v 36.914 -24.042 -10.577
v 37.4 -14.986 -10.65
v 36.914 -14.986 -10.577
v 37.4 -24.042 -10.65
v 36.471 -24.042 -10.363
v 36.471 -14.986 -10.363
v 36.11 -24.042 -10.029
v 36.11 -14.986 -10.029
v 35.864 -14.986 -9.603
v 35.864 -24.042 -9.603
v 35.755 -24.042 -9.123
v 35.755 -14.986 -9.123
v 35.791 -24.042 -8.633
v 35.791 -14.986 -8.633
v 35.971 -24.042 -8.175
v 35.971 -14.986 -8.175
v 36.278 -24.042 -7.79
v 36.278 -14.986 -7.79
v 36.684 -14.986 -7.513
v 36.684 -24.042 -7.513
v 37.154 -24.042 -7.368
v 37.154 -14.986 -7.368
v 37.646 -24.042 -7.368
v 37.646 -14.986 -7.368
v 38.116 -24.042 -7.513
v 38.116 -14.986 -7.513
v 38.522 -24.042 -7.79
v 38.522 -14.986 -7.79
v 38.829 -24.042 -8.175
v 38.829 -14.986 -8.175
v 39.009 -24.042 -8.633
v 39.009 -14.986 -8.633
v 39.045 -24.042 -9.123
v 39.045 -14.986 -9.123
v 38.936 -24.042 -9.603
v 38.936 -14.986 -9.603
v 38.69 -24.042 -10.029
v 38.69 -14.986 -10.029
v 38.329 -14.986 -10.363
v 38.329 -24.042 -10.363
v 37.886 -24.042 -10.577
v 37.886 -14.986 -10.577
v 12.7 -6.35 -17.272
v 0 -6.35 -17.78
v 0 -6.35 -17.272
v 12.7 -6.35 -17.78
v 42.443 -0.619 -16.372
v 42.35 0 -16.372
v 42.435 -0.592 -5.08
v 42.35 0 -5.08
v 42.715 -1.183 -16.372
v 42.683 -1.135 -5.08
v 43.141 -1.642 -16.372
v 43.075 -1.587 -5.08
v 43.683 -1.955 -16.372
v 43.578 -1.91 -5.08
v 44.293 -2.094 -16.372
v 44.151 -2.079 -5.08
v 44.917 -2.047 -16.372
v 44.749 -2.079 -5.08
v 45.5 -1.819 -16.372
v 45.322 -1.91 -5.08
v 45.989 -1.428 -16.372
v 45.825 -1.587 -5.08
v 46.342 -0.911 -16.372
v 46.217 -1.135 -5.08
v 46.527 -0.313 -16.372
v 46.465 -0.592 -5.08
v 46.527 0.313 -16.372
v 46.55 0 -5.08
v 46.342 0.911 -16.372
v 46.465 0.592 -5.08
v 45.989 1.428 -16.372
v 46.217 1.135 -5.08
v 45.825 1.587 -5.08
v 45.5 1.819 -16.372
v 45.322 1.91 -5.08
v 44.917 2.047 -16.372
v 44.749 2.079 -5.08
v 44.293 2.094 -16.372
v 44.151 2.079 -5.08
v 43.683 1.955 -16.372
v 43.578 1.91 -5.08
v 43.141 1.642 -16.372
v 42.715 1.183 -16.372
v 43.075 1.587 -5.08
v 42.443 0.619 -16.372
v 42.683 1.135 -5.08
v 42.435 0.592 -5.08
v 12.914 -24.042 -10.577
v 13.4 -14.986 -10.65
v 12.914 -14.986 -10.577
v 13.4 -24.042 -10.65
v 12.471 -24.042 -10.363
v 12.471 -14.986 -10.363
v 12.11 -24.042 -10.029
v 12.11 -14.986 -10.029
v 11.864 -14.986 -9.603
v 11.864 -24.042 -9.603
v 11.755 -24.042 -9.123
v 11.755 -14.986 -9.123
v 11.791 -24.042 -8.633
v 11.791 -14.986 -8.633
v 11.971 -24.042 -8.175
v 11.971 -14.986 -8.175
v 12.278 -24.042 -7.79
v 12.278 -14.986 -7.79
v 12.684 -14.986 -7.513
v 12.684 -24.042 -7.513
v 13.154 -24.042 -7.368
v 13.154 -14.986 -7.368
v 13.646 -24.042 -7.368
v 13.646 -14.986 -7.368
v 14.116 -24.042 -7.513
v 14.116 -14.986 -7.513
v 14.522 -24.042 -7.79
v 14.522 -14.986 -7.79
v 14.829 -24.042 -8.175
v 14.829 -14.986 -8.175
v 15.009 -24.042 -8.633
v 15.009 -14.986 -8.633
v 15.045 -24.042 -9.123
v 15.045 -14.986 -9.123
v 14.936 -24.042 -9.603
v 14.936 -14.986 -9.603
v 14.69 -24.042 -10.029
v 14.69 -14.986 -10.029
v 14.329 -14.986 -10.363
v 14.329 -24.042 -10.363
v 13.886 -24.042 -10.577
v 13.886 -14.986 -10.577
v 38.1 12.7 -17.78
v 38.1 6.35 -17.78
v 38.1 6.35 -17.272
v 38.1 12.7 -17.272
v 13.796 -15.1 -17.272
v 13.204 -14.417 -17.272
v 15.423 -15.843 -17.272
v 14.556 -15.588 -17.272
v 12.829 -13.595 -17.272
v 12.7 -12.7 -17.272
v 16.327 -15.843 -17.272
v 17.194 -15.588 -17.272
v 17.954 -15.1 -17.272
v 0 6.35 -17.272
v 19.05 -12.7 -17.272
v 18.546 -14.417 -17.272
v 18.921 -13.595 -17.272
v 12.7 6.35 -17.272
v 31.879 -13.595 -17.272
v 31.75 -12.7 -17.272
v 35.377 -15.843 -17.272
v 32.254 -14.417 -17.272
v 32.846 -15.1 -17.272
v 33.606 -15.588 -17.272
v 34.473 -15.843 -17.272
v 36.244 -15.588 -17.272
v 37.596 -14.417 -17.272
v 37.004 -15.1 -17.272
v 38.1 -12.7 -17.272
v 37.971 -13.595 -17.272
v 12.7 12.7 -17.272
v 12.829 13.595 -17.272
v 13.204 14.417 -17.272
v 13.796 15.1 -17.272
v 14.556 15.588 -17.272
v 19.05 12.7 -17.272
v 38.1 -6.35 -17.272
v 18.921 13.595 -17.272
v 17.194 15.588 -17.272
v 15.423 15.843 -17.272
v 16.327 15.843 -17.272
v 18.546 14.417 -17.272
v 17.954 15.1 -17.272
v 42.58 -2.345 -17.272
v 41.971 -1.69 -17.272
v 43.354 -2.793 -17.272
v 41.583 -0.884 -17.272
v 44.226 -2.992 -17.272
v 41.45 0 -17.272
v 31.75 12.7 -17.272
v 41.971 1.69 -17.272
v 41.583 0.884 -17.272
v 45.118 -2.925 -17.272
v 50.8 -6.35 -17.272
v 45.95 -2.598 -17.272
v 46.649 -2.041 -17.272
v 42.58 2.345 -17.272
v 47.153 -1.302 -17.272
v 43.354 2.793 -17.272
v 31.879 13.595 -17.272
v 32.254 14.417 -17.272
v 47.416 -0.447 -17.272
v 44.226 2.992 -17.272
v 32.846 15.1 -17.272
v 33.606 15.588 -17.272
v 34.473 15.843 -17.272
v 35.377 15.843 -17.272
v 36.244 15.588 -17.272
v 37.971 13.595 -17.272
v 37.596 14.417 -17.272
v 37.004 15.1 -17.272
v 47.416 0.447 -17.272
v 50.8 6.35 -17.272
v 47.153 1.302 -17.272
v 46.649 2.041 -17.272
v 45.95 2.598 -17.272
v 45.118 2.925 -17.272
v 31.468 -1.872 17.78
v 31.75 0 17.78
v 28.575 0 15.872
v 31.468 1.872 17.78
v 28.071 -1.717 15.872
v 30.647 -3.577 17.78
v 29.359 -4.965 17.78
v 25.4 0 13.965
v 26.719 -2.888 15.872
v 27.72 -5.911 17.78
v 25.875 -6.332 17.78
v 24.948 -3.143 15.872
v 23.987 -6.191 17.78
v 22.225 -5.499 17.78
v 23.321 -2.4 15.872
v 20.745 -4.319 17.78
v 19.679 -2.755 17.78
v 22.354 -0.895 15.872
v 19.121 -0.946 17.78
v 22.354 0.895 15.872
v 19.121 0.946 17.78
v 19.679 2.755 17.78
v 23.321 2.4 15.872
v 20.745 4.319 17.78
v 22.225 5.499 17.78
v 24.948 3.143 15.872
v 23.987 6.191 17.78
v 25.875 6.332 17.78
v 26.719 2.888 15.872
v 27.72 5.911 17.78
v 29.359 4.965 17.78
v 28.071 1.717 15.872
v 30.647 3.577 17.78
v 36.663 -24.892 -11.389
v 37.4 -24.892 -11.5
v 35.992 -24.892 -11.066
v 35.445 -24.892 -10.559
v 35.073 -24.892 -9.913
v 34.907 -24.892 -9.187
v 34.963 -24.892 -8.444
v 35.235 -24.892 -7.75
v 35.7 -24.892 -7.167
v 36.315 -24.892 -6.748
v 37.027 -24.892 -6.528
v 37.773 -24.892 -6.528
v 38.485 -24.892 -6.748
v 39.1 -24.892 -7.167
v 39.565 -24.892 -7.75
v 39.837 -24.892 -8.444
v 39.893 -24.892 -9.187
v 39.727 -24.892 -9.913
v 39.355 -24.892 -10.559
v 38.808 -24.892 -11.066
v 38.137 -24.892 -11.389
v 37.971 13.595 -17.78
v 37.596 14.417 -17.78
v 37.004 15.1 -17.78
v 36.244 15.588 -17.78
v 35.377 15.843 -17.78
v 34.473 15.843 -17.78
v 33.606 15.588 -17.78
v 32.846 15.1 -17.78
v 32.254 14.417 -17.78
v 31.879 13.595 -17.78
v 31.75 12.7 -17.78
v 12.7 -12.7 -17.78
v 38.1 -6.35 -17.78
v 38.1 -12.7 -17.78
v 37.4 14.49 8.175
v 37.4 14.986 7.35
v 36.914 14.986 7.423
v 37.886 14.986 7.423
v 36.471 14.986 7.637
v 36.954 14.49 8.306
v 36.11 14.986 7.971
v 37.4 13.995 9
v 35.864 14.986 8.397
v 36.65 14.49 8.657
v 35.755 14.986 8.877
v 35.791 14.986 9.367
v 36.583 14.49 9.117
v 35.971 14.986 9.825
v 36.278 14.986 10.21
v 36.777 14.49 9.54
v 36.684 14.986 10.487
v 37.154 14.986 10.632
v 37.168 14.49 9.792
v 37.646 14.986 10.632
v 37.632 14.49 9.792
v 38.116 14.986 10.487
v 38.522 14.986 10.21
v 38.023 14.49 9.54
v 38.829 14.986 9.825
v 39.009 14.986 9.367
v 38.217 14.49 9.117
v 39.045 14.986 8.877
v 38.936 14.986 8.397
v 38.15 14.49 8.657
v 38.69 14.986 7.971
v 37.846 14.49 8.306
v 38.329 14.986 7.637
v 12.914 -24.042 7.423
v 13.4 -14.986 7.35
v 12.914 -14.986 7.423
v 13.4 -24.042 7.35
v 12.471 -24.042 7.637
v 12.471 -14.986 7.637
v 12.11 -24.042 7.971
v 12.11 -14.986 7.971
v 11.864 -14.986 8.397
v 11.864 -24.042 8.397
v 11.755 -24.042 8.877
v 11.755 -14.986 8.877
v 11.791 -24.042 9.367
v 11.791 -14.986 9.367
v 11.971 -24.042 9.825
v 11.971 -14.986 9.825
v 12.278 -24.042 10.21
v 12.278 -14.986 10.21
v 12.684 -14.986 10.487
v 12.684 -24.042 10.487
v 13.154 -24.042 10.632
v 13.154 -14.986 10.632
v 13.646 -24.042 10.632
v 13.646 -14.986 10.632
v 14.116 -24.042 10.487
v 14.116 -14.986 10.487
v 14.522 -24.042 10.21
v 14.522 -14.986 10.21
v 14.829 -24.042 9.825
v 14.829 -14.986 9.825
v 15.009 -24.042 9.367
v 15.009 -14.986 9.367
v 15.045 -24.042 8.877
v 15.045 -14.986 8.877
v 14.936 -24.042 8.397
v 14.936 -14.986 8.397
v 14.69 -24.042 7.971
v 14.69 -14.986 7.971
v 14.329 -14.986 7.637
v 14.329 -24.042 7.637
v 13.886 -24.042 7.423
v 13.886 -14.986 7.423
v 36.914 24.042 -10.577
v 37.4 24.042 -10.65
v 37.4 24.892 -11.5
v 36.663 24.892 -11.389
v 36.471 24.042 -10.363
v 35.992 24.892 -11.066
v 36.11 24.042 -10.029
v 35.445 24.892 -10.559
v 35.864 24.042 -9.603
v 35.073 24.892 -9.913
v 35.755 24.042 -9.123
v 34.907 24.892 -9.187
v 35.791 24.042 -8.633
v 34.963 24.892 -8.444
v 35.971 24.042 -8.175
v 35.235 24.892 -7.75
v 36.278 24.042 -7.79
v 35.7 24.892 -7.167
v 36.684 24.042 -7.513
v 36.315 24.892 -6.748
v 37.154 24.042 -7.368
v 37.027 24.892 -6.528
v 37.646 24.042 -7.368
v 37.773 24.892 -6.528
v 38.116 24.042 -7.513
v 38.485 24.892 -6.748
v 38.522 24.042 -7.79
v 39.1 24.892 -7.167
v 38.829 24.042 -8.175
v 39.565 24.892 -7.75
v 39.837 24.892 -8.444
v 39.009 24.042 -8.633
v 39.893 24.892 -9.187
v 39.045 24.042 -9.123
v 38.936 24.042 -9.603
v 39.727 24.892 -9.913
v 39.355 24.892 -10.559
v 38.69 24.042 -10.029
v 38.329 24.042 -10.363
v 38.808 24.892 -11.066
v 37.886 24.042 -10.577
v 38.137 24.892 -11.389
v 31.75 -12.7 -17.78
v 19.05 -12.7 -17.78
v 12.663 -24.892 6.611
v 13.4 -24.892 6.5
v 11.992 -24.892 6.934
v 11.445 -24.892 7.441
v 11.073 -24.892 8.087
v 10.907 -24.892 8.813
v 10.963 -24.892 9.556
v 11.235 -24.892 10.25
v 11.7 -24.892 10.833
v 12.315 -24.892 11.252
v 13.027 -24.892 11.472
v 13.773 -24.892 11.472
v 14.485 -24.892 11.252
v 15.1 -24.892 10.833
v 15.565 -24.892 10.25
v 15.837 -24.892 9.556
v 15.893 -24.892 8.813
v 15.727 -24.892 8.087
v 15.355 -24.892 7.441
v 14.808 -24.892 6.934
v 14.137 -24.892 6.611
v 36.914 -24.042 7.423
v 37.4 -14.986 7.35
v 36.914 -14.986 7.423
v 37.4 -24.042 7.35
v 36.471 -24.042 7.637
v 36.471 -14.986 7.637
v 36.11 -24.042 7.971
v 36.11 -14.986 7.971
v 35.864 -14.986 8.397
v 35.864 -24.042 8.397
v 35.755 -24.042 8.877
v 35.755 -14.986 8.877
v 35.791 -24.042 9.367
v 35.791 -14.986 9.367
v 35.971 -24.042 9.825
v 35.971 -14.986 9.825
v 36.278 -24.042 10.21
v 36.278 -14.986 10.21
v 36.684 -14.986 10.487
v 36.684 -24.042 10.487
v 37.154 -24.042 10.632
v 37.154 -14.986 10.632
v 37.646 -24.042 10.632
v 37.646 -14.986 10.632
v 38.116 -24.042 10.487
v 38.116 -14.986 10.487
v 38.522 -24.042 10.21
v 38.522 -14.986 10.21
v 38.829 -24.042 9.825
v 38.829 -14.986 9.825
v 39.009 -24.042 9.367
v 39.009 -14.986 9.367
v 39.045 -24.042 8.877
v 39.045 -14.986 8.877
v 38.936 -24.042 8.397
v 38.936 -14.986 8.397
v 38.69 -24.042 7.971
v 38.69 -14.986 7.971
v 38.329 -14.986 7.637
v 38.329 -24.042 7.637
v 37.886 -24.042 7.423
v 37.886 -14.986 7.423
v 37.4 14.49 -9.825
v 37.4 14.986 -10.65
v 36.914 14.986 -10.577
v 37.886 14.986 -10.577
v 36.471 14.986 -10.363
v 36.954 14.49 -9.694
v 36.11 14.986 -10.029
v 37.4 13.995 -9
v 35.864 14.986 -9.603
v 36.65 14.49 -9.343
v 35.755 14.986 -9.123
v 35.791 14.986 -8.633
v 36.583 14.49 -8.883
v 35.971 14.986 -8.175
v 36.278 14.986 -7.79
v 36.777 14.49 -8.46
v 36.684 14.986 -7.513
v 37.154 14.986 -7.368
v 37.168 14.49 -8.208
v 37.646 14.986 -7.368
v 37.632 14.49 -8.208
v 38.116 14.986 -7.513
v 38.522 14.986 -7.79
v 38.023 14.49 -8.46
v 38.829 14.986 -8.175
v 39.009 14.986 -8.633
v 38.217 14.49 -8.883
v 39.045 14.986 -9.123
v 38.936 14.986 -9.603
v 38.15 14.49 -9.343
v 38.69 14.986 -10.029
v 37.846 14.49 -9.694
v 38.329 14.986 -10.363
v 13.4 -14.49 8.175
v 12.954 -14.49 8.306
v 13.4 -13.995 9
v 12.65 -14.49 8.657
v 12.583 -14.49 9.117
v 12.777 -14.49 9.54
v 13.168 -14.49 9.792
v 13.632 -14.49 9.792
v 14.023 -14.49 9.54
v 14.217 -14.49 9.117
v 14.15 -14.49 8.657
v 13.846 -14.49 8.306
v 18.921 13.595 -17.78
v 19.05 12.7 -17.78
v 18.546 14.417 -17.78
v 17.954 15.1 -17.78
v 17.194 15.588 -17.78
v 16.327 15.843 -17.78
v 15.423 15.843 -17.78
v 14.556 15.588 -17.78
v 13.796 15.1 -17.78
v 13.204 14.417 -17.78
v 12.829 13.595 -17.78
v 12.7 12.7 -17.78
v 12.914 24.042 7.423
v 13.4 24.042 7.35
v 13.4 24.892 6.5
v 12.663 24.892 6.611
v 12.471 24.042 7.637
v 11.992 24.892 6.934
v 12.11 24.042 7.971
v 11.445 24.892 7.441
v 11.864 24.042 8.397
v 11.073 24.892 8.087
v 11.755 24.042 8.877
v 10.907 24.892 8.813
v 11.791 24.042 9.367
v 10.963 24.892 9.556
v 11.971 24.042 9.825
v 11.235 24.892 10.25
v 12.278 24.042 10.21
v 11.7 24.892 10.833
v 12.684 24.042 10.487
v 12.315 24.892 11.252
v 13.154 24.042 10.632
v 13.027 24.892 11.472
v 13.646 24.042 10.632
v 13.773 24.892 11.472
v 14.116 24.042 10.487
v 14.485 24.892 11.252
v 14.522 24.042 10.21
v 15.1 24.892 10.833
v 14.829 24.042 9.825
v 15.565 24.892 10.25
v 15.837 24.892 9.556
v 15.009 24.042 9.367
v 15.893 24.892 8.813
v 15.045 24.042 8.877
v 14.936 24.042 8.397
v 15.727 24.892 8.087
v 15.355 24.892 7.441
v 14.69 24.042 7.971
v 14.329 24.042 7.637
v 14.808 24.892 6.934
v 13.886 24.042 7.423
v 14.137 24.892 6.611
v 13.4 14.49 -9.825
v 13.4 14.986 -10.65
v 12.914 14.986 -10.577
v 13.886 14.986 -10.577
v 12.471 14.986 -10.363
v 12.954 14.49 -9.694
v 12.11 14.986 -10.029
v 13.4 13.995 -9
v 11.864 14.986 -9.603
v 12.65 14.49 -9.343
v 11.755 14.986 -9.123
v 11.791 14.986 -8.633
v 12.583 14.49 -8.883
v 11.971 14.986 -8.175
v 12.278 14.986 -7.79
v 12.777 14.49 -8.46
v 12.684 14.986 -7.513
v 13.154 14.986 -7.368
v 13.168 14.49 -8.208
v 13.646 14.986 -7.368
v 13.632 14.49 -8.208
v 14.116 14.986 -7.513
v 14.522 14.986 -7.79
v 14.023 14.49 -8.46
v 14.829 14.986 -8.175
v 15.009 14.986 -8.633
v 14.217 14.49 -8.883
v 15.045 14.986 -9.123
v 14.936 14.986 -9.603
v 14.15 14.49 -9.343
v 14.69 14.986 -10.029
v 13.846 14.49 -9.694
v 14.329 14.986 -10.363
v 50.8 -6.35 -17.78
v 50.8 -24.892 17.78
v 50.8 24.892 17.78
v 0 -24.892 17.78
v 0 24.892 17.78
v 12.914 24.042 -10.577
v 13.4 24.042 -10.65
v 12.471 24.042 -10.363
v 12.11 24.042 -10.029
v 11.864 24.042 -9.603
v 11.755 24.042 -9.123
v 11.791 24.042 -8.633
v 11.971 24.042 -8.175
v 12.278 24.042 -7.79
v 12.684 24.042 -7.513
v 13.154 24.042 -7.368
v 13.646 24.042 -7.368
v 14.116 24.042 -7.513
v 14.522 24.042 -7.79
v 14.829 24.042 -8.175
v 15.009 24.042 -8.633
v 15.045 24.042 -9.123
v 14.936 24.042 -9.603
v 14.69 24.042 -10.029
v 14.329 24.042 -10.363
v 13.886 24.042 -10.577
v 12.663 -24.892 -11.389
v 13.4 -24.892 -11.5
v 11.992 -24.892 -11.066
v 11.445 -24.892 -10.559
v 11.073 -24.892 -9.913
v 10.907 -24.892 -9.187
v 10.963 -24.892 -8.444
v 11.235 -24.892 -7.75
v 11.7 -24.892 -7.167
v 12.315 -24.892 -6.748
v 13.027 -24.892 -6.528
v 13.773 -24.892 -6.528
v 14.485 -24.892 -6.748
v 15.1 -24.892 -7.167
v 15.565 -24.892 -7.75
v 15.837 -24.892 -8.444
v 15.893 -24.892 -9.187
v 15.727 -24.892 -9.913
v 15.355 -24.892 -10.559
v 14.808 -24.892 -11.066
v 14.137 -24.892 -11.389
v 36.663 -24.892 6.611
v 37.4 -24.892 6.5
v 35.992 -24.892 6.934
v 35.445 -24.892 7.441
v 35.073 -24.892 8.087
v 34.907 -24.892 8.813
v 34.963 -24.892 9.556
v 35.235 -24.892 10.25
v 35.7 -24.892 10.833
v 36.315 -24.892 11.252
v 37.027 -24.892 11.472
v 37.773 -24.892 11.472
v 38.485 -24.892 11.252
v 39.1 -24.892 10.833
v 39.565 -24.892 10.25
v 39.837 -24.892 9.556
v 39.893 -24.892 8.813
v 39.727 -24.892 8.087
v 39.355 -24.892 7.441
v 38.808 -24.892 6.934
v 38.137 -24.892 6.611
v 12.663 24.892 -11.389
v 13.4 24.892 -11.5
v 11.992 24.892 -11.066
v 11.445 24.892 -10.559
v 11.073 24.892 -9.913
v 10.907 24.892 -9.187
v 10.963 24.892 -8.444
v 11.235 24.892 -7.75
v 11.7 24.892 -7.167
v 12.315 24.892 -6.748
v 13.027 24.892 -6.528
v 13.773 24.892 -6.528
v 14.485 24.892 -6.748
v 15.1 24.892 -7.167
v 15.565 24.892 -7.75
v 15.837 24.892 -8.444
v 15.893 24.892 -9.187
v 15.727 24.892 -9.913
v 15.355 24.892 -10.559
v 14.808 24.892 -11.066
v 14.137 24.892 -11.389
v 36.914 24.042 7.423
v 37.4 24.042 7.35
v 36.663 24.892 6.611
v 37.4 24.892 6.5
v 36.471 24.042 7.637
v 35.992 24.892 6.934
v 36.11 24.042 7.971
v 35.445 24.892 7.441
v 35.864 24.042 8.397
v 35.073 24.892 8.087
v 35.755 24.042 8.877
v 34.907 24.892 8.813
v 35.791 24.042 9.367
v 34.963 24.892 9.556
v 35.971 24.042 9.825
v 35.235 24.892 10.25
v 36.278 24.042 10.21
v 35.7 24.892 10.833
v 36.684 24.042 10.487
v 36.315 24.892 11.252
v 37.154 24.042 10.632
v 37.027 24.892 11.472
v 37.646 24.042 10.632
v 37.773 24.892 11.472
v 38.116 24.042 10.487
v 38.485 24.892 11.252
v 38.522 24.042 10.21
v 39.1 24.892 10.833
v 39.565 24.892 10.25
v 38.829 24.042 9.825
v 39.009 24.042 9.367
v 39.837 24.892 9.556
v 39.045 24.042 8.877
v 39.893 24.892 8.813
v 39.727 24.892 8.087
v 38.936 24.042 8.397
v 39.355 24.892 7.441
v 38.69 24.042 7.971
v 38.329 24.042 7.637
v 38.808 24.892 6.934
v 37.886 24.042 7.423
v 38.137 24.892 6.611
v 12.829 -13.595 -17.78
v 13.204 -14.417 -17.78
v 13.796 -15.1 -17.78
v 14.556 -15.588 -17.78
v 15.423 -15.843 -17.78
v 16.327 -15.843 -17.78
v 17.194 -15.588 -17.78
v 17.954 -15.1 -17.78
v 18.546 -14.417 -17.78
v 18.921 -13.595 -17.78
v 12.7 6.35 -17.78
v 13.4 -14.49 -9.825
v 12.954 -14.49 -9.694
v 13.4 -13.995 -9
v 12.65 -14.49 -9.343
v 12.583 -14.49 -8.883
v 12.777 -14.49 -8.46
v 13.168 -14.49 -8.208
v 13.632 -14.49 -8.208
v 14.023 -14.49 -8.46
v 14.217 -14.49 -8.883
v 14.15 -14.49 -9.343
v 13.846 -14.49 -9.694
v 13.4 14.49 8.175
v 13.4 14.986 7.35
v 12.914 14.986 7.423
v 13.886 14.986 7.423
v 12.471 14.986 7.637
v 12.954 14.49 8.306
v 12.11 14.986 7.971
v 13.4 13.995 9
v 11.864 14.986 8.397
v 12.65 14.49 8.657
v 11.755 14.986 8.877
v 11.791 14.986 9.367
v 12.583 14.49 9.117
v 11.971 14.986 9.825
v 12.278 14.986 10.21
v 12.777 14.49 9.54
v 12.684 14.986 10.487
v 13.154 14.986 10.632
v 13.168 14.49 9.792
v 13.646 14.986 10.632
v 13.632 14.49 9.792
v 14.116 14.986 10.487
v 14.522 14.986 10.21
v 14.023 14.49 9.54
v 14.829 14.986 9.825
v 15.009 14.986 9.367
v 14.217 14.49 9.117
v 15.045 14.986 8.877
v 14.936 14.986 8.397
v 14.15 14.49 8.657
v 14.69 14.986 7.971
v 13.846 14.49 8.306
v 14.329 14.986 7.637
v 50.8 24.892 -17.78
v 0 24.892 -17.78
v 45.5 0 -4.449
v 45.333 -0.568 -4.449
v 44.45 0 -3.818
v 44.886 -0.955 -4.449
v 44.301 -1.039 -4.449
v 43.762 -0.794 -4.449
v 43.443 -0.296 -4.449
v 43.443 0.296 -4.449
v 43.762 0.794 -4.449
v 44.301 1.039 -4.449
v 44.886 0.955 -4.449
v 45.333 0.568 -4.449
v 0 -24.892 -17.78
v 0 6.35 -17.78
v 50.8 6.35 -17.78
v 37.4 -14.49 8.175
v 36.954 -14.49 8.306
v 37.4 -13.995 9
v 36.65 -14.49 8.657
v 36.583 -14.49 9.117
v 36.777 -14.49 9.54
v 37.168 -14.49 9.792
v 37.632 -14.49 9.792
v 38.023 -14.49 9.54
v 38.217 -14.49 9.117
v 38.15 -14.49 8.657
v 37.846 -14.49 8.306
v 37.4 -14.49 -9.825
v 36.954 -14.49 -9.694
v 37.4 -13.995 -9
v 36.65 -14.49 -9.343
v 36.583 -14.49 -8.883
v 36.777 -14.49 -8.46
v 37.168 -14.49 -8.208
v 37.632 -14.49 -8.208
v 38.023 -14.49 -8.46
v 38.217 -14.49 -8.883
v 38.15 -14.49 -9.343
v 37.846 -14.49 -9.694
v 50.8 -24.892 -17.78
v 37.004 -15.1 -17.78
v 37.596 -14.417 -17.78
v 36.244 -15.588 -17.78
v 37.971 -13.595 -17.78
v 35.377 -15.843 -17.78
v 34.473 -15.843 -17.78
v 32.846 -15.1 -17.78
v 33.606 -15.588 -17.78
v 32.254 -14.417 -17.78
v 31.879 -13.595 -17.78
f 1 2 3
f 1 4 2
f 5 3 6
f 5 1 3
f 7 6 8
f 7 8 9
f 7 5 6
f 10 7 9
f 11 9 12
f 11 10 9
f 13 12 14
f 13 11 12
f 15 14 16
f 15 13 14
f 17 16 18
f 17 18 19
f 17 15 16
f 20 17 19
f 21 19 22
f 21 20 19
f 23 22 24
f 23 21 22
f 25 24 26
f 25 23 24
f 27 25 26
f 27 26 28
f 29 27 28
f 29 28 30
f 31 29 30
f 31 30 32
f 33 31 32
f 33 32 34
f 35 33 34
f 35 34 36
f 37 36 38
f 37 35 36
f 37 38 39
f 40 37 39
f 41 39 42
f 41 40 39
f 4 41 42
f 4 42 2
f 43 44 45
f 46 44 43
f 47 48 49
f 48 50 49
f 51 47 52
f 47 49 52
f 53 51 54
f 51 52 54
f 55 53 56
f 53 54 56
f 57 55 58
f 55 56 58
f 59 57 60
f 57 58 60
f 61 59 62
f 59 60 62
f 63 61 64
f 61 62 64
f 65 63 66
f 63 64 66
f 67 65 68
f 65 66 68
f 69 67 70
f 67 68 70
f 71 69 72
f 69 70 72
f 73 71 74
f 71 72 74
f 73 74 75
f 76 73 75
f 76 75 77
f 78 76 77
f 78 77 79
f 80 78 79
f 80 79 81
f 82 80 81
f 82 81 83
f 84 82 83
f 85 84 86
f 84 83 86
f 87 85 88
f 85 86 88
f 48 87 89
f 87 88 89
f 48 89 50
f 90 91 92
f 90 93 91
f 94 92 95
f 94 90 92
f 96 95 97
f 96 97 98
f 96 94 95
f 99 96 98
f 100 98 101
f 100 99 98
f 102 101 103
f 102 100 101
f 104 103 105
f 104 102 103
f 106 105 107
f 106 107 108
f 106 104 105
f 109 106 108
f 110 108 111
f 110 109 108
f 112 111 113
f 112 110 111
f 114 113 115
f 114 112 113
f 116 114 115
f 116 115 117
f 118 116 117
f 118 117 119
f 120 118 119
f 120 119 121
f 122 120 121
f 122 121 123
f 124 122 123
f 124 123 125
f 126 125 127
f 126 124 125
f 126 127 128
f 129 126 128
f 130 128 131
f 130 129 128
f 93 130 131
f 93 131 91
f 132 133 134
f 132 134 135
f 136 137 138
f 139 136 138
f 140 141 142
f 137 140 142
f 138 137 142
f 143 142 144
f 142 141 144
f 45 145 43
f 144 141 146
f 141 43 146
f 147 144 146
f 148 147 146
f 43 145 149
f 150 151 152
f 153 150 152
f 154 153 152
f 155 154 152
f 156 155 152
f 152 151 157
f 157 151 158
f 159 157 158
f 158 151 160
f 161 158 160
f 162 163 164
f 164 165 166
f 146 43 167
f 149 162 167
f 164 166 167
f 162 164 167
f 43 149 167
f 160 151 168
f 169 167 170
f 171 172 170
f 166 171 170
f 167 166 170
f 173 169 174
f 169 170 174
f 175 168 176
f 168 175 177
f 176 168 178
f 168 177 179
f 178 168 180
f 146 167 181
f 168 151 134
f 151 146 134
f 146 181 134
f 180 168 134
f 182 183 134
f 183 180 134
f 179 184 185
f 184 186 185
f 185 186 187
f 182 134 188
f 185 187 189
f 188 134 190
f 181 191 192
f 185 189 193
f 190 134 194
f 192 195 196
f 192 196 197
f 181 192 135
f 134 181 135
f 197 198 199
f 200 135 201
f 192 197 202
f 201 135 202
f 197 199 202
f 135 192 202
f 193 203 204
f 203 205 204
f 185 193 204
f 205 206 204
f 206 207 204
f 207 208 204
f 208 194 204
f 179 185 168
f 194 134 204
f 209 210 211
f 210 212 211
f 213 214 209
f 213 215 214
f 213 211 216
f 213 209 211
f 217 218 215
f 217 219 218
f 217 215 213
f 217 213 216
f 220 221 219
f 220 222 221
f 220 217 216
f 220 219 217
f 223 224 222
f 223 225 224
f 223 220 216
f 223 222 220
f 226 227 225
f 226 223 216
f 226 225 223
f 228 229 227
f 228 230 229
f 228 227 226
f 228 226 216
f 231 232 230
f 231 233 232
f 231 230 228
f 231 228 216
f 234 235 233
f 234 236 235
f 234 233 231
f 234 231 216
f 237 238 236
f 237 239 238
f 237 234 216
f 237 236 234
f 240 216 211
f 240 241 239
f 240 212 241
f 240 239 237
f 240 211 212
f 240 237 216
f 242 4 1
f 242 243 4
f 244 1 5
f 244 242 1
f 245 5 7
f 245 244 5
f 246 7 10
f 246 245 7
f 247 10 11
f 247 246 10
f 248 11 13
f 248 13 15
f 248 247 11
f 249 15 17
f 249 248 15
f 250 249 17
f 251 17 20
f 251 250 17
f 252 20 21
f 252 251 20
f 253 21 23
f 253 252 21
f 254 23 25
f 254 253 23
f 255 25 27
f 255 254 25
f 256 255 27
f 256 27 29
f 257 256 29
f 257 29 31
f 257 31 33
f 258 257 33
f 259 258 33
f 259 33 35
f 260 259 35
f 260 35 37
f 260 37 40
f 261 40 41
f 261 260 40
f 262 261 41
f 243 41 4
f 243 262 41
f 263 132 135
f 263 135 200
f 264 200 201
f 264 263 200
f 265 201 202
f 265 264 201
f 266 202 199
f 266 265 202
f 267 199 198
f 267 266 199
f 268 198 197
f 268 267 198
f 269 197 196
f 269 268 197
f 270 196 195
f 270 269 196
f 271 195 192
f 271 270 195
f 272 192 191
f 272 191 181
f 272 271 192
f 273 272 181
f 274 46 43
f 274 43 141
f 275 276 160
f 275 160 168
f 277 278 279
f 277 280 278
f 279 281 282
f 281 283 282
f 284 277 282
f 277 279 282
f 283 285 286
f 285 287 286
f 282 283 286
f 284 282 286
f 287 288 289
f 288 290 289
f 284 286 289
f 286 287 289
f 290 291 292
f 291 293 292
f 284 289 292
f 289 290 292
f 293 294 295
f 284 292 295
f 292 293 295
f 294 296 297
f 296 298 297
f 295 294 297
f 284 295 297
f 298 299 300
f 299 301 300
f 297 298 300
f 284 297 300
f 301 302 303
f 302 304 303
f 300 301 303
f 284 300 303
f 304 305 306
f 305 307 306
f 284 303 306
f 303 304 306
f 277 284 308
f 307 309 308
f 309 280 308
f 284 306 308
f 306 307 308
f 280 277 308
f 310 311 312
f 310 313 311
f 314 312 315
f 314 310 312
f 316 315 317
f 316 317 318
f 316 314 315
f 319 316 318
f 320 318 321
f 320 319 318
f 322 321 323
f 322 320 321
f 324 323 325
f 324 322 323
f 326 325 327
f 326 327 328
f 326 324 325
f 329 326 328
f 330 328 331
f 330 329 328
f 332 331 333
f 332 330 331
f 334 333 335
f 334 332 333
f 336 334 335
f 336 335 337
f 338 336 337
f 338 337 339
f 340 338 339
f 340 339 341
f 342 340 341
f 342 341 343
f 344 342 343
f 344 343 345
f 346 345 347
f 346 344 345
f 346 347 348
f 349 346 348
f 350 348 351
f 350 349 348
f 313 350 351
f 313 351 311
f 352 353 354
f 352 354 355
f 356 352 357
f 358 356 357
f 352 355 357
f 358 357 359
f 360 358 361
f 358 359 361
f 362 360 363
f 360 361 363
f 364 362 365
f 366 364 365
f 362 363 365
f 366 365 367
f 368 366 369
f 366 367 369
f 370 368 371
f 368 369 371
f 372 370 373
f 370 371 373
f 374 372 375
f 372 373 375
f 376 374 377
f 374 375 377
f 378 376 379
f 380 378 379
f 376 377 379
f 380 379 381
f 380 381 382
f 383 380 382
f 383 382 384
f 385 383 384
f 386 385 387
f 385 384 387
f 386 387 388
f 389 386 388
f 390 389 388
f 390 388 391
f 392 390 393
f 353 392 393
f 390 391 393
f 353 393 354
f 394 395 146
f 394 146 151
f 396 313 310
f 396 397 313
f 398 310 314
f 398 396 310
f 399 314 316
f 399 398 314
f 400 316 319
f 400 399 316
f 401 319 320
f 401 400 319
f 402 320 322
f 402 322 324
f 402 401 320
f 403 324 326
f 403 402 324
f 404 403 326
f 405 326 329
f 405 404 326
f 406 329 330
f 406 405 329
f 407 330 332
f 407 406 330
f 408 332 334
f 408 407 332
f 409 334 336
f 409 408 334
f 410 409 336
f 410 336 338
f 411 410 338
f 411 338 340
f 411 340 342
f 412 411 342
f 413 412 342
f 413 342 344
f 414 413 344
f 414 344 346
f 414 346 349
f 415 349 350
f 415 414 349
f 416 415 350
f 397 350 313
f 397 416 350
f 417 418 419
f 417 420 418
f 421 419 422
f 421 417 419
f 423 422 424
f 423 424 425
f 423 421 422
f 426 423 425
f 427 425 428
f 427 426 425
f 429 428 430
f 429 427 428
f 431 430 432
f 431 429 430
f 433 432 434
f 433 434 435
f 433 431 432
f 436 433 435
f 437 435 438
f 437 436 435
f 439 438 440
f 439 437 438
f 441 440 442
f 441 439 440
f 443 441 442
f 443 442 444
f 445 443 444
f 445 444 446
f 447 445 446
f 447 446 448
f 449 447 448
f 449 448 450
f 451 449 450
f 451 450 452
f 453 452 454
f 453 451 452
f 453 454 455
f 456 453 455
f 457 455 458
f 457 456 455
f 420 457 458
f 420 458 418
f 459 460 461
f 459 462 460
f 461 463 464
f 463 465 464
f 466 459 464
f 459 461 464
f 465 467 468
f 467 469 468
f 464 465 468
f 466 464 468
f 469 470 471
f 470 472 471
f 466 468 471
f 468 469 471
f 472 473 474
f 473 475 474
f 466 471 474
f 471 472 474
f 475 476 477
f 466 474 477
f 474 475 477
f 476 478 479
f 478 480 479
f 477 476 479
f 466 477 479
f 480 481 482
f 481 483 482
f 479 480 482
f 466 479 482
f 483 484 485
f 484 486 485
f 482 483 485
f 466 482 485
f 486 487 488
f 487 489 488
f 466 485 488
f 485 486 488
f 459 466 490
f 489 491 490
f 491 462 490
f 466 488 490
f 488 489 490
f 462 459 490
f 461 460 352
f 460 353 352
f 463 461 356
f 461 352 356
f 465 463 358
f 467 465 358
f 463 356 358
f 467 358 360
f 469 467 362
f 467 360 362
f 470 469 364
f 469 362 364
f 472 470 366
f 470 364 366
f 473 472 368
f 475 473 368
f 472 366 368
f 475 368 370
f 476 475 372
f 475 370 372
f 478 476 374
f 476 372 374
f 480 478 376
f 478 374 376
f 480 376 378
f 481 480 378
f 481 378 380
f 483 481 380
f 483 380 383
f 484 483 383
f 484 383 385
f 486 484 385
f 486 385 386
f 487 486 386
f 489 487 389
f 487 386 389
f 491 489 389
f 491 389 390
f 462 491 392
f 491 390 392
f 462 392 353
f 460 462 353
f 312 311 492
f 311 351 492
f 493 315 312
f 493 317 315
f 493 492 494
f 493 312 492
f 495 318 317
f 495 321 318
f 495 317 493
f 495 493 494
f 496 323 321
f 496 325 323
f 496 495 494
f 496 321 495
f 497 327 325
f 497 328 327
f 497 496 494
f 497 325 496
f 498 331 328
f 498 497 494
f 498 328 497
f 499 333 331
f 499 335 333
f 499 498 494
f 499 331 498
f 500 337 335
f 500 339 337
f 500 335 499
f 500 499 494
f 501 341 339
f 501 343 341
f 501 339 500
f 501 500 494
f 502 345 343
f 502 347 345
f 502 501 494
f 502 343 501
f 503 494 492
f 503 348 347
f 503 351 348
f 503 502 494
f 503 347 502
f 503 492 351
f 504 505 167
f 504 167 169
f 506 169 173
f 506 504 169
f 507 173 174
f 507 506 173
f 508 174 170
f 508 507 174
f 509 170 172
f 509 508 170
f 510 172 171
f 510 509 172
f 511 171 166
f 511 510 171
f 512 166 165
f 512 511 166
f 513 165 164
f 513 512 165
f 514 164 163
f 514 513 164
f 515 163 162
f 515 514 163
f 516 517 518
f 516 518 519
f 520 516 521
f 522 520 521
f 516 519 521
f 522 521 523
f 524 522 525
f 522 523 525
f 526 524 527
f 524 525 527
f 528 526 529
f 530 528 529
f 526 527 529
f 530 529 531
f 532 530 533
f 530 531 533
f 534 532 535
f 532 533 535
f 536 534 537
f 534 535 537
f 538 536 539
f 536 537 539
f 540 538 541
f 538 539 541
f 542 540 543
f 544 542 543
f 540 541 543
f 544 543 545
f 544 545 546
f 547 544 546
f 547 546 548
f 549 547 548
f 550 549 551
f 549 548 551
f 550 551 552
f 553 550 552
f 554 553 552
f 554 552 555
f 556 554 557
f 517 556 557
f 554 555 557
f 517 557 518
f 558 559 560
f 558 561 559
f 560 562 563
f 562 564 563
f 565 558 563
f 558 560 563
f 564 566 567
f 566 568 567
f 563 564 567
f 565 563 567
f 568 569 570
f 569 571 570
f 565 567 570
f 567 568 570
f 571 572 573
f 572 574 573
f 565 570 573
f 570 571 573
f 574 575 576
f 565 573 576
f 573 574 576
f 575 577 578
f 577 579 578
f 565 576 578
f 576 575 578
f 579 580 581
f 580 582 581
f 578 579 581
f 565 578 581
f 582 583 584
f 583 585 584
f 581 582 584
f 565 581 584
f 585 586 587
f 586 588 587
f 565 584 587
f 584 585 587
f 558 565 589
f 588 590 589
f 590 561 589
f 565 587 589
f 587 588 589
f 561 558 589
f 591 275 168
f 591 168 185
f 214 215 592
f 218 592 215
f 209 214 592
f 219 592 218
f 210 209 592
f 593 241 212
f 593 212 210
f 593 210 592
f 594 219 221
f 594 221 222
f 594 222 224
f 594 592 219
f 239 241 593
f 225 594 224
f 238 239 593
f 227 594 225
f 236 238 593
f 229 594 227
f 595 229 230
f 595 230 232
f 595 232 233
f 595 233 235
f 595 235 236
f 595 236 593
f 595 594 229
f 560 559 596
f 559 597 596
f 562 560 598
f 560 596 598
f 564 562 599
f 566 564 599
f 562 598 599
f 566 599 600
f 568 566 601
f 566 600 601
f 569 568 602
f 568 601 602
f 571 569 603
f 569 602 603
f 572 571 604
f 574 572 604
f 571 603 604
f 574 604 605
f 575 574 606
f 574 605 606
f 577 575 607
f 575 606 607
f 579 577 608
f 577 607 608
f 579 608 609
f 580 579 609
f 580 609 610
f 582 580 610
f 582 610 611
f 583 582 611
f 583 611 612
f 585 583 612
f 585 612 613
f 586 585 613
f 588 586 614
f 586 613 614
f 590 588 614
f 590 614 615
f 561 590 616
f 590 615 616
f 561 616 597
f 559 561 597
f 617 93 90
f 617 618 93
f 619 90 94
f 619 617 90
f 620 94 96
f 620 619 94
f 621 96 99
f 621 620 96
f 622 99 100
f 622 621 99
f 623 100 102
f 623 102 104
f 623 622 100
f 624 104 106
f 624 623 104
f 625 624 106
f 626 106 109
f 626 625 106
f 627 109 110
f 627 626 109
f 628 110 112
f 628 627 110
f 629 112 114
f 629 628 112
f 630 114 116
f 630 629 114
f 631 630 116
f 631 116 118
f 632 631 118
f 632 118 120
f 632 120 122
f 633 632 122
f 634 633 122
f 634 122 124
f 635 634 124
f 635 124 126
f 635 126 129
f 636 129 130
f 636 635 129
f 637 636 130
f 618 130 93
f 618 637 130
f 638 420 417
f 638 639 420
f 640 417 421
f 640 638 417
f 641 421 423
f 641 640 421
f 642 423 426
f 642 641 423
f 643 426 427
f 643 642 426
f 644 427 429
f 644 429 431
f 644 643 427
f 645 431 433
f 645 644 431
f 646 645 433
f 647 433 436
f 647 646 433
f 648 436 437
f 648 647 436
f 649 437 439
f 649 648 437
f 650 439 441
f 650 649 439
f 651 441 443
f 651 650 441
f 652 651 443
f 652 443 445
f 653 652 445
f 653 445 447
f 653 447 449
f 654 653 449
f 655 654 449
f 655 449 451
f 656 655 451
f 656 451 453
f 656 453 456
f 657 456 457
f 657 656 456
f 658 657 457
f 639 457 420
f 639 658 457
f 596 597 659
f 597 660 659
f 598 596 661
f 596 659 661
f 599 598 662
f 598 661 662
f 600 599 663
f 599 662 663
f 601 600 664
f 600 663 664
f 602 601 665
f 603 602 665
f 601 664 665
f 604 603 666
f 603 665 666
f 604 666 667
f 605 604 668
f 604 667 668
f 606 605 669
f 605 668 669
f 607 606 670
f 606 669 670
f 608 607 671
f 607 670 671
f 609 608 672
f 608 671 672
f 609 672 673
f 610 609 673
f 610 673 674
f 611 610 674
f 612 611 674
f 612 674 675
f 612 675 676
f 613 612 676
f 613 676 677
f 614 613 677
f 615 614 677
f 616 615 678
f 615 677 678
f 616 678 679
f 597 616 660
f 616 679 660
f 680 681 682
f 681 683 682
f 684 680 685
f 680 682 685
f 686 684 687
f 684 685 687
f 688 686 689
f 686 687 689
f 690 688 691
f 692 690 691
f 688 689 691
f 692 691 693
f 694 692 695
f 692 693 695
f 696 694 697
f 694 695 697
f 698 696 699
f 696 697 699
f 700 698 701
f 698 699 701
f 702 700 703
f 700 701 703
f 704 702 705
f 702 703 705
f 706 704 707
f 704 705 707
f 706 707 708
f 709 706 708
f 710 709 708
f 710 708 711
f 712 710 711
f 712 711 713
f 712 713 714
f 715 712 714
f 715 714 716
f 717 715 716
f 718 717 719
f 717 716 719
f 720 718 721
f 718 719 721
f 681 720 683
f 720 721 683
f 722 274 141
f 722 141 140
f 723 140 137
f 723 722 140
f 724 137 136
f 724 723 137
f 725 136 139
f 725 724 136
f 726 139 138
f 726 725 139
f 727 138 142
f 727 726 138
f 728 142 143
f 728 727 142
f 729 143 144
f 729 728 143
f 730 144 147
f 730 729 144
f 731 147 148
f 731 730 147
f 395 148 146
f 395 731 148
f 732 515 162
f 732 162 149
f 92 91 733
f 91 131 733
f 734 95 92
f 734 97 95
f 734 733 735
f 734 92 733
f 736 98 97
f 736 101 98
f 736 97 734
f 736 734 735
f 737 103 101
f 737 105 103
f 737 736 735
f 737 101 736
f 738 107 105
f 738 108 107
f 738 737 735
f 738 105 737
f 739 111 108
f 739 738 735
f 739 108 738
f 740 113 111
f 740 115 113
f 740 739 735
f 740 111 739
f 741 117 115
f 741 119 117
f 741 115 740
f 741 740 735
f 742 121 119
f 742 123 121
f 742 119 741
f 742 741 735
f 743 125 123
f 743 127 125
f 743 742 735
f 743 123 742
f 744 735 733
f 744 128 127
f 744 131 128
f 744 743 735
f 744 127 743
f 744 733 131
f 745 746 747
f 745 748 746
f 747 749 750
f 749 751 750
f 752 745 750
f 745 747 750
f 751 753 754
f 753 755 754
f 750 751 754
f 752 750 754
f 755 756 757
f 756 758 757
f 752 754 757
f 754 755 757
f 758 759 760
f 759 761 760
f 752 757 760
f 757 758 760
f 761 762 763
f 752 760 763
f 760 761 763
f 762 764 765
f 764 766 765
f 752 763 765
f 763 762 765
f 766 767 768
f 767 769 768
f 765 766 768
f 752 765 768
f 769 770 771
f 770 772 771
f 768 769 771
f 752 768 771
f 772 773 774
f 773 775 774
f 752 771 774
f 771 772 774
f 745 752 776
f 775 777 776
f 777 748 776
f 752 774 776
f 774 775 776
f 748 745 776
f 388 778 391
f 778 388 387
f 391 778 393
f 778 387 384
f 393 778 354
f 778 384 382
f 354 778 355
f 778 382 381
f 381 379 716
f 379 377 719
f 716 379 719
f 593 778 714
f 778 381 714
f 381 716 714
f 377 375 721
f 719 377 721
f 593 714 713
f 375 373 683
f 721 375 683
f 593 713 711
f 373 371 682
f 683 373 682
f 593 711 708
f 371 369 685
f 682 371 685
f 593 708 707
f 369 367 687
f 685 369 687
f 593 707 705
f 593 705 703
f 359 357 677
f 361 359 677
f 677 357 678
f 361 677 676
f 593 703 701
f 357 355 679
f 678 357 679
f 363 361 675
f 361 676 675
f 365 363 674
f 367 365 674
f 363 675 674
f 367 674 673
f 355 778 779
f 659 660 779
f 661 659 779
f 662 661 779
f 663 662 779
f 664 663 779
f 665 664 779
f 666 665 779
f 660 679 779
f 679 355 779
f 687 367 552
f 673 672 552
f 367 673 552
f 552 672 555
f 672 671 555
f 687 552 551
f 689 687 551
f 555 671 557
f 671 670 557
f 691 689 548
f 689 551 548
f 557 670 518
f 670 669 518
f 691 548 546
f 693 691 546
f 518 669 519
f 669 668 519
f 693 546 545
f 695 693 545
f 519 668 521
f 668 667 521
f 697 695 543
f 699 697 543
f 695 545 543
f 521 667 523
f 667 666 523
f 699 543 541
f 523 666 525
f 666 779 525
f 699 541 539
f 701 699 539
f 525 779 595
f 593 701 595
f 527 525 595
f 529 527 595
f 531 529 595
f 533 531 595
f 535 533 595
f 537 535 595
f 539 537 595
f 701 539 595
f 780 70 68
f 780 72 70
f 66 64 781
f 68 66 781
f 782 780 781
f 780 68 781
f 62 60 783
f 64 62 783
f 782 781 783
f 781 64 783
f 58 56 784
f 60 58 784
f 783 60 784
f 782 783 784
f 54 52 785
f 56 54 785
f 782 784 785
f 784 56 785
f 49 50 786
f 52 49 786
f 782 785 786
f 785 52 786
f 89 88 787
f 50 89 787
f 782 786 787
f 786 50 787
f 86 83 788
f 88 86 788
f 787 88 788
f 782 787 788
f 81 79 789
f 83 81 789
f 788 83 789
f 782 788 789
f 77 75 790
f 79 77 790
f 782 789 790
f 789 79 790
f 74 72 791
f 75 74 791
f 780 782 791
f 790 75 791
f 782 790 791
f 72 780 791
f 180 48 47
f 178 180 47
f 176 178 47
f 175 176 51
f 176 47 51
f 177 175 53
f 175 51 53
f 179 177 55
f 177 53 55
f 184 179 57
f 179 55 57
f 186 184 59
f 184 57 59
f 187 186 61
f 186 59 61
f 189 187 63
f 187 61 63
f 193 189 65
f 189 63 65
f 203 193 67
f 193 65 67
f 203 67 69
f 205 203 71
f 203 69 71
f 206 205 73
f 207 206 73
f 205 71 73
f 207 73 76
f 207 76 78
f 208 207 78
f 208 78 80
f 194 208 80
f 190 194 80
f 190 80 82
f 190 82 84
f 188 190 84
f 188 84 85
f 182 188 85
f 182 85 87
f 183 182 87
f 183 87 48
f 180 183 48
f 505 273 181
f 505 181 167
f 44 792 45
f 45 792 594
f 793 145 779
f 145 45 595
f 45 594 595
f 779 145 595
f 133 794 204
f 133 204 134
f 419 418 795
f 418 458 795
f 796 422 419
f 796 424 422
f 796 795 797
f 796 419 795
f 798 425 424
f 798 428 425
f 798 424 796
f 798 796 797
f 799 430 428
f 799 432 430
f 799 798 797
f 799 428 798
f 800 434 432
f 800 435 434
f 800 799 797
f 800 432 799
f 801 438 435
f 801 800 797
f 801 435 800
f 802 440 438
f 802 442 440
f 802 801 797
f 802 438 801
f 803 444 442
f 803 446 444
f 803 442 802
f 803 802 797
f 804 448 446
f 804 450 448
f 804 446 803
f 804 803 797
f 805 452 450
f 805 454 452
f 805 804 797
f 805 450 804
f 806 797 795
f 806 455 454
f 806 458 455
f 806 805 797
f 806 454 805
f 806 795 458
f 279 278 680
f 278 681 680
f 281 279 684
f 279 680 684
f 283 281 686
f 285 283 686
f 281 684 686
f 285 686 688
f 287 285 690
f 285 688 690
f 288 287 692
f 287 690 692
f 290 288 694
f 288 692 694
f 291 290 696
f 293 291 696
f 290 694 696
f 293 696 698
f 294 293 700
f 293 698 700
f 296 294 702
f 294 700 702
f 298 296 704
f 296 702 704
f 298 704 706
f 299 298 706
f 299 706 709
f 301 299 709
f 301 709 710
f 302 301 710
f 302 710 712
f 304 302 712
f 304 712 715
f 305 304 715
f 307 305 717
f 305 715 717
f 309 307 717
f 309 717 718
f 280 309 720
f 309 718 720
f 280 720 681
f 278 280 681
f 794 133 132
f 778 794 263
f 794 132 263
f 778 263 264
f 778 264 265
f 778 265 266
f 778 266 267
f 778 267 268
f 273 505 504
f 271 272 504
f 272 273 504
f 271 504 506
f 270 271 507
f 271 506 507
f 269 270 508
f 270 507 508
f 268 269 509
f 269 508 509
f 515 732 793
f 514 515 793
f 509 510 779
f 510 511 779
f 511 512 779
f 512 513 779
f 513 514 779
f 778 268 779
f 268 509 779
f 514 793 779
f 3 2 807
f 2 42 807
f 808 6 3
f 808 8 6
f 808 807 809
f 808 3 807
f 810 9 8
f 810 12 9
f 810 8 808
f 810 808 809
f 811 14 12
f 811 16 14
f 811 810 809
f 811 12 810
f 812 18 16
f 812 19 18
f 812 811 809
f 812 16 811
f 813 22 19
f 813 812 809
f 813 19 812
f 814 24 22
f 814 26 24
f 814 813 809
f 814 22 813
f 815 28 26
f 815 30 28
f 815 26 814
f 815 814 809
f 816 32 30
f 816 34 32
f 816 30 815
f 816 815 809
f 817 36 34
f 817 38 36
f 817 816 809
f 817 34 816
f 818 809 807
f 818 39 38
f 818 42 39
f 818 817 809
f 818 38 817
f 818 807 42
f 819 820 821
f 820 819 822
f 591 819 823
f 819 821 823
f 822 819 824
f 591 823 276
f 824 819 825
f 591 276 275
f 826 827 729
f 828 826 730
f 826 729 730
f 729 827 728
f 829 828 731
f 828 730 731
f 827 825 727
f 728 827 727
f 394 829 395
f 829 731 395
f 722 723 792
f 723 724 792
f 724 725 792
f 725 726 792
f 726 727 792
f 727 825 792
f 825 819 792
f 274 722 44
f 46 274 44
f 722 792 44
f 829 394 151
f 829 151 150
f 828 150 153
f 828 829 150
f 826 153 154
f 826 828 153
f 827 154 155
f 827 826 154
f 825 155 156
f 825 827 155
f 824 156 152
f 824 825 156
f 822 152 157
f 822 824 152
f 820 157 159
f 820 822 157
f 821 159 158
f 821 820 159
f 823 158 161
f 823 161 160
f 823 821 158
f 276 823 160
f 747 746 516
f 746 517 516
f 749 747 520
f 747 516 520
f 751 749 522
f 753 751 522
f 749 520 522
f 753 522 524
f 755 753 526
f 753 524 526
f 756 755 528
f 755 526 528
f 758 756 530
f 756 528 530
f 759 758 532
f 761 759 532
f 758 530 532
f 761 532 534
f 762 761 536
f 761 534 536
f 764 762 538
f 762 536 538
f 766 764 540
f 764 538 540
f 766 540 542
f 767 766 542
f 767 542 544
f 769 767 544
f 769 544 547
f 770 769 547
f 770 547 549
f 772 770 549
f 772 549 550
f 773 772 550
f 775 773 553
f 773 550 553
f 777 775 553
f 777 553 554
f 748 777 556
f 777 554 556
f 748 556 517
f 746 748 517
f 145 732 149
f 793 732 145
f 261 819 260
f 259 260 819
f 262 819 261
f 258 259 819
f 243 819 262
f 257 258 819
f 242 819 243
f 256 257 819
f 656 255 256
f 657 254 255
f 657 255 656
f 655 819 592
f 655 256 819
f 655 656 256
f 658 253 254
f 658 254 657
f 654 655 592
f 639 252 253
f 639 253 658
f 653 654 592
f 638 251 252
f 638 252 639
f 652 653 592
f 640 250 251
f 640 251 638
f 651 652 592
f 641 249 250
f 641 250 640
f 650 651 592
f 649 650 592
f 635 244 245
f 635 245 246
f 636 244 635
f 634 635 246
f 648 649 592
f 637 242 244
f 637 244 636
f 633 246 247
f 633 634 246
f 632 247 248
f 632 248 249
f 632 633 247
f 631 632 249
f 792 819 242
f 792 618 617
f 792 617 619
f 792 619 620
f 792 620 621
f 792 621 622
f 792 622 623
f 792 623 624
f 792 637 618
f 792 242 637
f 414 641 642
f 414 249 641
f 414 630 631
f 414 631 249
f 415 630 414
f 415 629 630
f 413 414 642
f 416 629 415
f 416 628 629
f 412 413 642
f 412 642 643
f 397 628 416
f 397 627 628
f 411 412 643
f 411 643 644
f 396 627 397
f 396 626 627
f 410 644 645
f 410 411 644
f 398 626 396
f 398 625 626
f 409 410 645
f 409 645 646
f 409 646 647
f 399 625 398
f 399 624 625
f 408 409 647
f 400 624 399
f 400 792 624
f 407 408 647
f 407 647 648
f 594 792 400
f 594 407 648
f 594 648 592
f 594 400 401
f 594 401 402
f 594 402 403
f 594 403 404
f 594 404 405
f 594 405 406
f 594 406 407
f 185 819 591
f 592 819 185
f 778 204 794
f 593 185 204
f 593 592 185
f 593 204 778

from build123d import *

# Parameters (mm, degrees)
SKETCH1_W                       = 49.784
SKETCH1_H                       = 35.56
BOSS_EXTRUDE1_DEPTH             = 50.8
M4X0_7_TAPPED_HOLE1_AT_2_COUNT  = 2
M4X0_7_TAPPED_HOLE1_AT_2_PITCH  = 30
M4X0_7_TAPPED_HOLE1_AT_3_COUNT  = 2
M4X0_7_TAPPED_HOLE1_AT_3_PITCH  = 18
M4X0_7_TAPPED_HOLE1_AT_4_COUNT  = 2
M4X0_7_TAPPED_HOLE1_AT_4_PITCH  = 24
CUT_EXTRUDE2_DEPTH              = 0.508
MIRROR2_START                   = -17.78
MIRROR2_DEPTH                   = 0.508
M5X0_8_TAPPED_HOLE1_D           = 4.2
M5X0_8_TAPPED_HOLE1_DEPTH       = 12.192
M5X0_8_TAPPED_HOLE1_CSINK_D     = 6
M5X0_8_TAPPED_HOLE1_CSINK_ANGLE = 90
M5X0_8_TAPPED_HOLE1_TIP         = 1.2618073


# Read off the part's stored shape, not the designer's step: Mirror2
with BuildPart() as part:
    # Sketch1 → Boss-Extrude1 (new body)
    with BuildSketch(Plane.YZ):
        Rectangle(SKETCH1_W, SKETCH1_H)
    extrude(amount=BOSS_EXTRUDE1_DEPTH)

    # Sketch3 → M4x0.7 Tapped Hole1 (revolve, cut)
    with BuildSketch(Plane(origin=(13.4, -24.892, -9), x_dir=(0, 0, -1), z_dir=(1, 0, 0))):
        Polygon((0, 0), (0, 10.897420021), (1.65, 9.906), (1.65, 0.85), (2.5, 0), align=None)
    m4x0_7_tapped_hole1 = revolve(axis=Axis((13.4, -31.242, -9), (0, 1, 0)), mode=Mode.SUBTRACT)

    # M4x0.7 Tapped Hole1 at 2: M4x0.7 Tapped Hole1 ×2
    with Locations(*[Vector(0.8000000000000002, 0, 0.5999999999999998) * (i * M4X0_7_TAPPED_HOLE1_AT_2_PITCH) for i in range(1, M4X0_7_TAPPED_HOLE1_AT_2_COUNT)]):
        add(m4x0_7_tapped_hole1, mode=Mode.SUBTRACT)

    # M4x0.7 Tapped Hole1 at 3: M4x0.7 Tapped Hole1 ×2
    with Locations(*[(0, 0, i * M4X0_7_TAPPED_HOLE1_AT_3_PITCH) for i in range(1, M4X0_7_TAPPED_HOLE1_AT_3_COUNT)]):
        add(m4x0_7_tapped_hole1, mode=Mode.SUBTRACT)

    # M4x0.7 Tapped Hole1 at 4: M4x0.7 Tapped Hole1 ×2
    with Locations(*[(i * M4X0_7_TAPPED_HOLE1_AT_4_PITCH, 0, 0) for i in range(1, M4X0_7_TAPPED_HOLE1_AT_4_COUNT)]):
        add(m4x0_7_tapped_hole1, mode=Mode.SUBTRACT)

    # Mirror1: M4x0.7 Tapped Hole1 across plane
    add(m4x0_7_tapped_hole1.mirror(Plane.ZX), mode=Mode.SUBTRACT)

    # Mirror1 copy 1 sketch → Mirror1 copy 1 (revolve, cut)
    with BuildSketch(Plane(origin=(37.4, 24.892, 9), x_dir=(0, 0, -1), z_dir=(1, 0, 0))):
        Polygon((0, 0), (0, -10.897420021), (1.65, -9.906), (1.65, -0.85), (2.5, 0), align=None)
    revolve(axis=Axis((37.4, 31.242, 9), (0, 1, 0)), mode=Mode.SUBTRACT)

    # Mirror1 copy 2 sketch → Mirror1 copy 2 (revolve, cut)
    with BuildSketch(Plane(origin=(13.4, 24.892, 9), x_dir=(0, 0, -1), z_dir=(1, 0, 0))):
        Polygon((0, 0), (0, -10.897420021), (1.65, -9.906), (1.65, -0.85), (2.5, 0), align=None)
    revolve(axis=Axis((13.4, 31.242, 9), (0, 1, 0)), mode=Mode.SUBTRACT)

    # Mirror1 copy 3 sketch → Mirror1 copy 3 (revolve, cut)
    with BuildSketch(Plane(origin=(37.4, 24.892, -9), x_dir=(0, 0, -1), z_dir=(1, 0, 0))):
        Polygon((0, 0), (0, -10.897420021), (1.65, -9.906), (1.65, -0.85), (2.5, 0), align=None)
    revolve(axis=Axis((37.4, 31.242, -9), (0, 1, 0)), mode=Mode.SUBTRACT)

    # Sketch5 → Cut-Revolve1 (revolve, cut)
    with BuildSketch(Plane(origin=(0, 0, 0), x_dir=(-1, 0, 0), z_dir=(0, 1, 0))):
        Polygon((-25.4, 17.78), (-25.4, 13.964535069), (-31.75, 17.78), align=None)
    revolve(axis=Axis((25.4, 0, 17.78), (0, 0, -1)), mode=Mode.SUBTRACT)

    # Sketch9 → Cut-Extrude2 (cut)
    with BuildSketch(Plane(origin=(0, 0, -17.78), x_dir=(1, 0, 0), z_dir=(0, 0, -1))):
        with BuildLine():
            Line((25.4, 12.7), (31.75, 12.7))
            ThreePointArc((31.75, 12.7), (34.925, 15.875), (38.1, 12.7))
            Line((38.1, 12.7), (38.1, 6.35))
            Line((38.1, 6.35), (50.8, 6.35))
            Line((50.8, 6.35), (50.8, 0))
            Line((50.8, 0), (25.4, 0))
            Line((25.4, 0), (25.4, 12.7))
        make_face()
    extrude(amount=-CUT_EXTRUDE2_DEPTH, mode=Mode.SUBTRACT)

    # Mirror2 outline → Mirror2 (cut)
    with BuildSketch(Plane.XY.offset(MIRROR2_START)):
        with BuildLine():
            Line((38.1, 6.35), (38.1, 12.7))
            ThreePointArc((38.1, 12.7), (34.925, 15.875), (31.75, 12.7))
            Line((31.75, 12.7), (19.05, 12.7))
            ThreePointArc((19.05, 12.7), (15.875, 15.875), (12.7, 12.7))
            Line((12.7, 12.7), (12.7, 6.35))
            Line((12.7, 6.35), (0, 6.35))
            Line((0, 6.35), (0, -6.35))
            Line((0, -6.35), (12.7, -6.35))
            Line((12.7, -6.35), (12.7, -12.7))
            ThreePointArc((12.7, -12.7), (15.875, -15.875), (19.05, -12.7))
            Line((19.05, -12.7), (25.4, -12.7))
            Line((25.4, -12.7), (25.4, 0))
            Line((25.4, 0), (50.8, 0))
            Line((50.8, 0), (50.8, 6.35))
            Line((50.8, 6.35), (38.1, 6.35))
        make_face()
    extrude(amount=MIRROR2_DEPTH, mode=Mode.SUBTRACT)

    # M5x0.8 Tapped Hole1
    with Locations(Plane(origin=(0, 0, -17.272), x_dir=(1, 0, 0), z_dir=(0, 0, -1))):
        with Locations((44.45, 0)):
            CounterSinkHole(M5X0_8_TAPPED_HOLE1_D / 2, M5X0_8_TAPPED_HOLE1_CSINK_D / 2, depth=M5X0_8_TAPPED_HOLE1_DEPTH, counter_sink_angle=M5X0_8_TAPPED_HOLE1_CSINK_ANGLE)
            with Locations((0, 0, -(M5X0_8_TAPPED_HOLE1_DEPTH + M5X0_8_TAPPED_HOLE1_TIP / 2))):  # 118° drill point
                Cone(0, M5X0_8_TAPPED_HOLE1_D / 2, M5X0_8_TAPPED_HOLE1_TIP, mode=Mode.SUBTRACT)


solid = part.part
